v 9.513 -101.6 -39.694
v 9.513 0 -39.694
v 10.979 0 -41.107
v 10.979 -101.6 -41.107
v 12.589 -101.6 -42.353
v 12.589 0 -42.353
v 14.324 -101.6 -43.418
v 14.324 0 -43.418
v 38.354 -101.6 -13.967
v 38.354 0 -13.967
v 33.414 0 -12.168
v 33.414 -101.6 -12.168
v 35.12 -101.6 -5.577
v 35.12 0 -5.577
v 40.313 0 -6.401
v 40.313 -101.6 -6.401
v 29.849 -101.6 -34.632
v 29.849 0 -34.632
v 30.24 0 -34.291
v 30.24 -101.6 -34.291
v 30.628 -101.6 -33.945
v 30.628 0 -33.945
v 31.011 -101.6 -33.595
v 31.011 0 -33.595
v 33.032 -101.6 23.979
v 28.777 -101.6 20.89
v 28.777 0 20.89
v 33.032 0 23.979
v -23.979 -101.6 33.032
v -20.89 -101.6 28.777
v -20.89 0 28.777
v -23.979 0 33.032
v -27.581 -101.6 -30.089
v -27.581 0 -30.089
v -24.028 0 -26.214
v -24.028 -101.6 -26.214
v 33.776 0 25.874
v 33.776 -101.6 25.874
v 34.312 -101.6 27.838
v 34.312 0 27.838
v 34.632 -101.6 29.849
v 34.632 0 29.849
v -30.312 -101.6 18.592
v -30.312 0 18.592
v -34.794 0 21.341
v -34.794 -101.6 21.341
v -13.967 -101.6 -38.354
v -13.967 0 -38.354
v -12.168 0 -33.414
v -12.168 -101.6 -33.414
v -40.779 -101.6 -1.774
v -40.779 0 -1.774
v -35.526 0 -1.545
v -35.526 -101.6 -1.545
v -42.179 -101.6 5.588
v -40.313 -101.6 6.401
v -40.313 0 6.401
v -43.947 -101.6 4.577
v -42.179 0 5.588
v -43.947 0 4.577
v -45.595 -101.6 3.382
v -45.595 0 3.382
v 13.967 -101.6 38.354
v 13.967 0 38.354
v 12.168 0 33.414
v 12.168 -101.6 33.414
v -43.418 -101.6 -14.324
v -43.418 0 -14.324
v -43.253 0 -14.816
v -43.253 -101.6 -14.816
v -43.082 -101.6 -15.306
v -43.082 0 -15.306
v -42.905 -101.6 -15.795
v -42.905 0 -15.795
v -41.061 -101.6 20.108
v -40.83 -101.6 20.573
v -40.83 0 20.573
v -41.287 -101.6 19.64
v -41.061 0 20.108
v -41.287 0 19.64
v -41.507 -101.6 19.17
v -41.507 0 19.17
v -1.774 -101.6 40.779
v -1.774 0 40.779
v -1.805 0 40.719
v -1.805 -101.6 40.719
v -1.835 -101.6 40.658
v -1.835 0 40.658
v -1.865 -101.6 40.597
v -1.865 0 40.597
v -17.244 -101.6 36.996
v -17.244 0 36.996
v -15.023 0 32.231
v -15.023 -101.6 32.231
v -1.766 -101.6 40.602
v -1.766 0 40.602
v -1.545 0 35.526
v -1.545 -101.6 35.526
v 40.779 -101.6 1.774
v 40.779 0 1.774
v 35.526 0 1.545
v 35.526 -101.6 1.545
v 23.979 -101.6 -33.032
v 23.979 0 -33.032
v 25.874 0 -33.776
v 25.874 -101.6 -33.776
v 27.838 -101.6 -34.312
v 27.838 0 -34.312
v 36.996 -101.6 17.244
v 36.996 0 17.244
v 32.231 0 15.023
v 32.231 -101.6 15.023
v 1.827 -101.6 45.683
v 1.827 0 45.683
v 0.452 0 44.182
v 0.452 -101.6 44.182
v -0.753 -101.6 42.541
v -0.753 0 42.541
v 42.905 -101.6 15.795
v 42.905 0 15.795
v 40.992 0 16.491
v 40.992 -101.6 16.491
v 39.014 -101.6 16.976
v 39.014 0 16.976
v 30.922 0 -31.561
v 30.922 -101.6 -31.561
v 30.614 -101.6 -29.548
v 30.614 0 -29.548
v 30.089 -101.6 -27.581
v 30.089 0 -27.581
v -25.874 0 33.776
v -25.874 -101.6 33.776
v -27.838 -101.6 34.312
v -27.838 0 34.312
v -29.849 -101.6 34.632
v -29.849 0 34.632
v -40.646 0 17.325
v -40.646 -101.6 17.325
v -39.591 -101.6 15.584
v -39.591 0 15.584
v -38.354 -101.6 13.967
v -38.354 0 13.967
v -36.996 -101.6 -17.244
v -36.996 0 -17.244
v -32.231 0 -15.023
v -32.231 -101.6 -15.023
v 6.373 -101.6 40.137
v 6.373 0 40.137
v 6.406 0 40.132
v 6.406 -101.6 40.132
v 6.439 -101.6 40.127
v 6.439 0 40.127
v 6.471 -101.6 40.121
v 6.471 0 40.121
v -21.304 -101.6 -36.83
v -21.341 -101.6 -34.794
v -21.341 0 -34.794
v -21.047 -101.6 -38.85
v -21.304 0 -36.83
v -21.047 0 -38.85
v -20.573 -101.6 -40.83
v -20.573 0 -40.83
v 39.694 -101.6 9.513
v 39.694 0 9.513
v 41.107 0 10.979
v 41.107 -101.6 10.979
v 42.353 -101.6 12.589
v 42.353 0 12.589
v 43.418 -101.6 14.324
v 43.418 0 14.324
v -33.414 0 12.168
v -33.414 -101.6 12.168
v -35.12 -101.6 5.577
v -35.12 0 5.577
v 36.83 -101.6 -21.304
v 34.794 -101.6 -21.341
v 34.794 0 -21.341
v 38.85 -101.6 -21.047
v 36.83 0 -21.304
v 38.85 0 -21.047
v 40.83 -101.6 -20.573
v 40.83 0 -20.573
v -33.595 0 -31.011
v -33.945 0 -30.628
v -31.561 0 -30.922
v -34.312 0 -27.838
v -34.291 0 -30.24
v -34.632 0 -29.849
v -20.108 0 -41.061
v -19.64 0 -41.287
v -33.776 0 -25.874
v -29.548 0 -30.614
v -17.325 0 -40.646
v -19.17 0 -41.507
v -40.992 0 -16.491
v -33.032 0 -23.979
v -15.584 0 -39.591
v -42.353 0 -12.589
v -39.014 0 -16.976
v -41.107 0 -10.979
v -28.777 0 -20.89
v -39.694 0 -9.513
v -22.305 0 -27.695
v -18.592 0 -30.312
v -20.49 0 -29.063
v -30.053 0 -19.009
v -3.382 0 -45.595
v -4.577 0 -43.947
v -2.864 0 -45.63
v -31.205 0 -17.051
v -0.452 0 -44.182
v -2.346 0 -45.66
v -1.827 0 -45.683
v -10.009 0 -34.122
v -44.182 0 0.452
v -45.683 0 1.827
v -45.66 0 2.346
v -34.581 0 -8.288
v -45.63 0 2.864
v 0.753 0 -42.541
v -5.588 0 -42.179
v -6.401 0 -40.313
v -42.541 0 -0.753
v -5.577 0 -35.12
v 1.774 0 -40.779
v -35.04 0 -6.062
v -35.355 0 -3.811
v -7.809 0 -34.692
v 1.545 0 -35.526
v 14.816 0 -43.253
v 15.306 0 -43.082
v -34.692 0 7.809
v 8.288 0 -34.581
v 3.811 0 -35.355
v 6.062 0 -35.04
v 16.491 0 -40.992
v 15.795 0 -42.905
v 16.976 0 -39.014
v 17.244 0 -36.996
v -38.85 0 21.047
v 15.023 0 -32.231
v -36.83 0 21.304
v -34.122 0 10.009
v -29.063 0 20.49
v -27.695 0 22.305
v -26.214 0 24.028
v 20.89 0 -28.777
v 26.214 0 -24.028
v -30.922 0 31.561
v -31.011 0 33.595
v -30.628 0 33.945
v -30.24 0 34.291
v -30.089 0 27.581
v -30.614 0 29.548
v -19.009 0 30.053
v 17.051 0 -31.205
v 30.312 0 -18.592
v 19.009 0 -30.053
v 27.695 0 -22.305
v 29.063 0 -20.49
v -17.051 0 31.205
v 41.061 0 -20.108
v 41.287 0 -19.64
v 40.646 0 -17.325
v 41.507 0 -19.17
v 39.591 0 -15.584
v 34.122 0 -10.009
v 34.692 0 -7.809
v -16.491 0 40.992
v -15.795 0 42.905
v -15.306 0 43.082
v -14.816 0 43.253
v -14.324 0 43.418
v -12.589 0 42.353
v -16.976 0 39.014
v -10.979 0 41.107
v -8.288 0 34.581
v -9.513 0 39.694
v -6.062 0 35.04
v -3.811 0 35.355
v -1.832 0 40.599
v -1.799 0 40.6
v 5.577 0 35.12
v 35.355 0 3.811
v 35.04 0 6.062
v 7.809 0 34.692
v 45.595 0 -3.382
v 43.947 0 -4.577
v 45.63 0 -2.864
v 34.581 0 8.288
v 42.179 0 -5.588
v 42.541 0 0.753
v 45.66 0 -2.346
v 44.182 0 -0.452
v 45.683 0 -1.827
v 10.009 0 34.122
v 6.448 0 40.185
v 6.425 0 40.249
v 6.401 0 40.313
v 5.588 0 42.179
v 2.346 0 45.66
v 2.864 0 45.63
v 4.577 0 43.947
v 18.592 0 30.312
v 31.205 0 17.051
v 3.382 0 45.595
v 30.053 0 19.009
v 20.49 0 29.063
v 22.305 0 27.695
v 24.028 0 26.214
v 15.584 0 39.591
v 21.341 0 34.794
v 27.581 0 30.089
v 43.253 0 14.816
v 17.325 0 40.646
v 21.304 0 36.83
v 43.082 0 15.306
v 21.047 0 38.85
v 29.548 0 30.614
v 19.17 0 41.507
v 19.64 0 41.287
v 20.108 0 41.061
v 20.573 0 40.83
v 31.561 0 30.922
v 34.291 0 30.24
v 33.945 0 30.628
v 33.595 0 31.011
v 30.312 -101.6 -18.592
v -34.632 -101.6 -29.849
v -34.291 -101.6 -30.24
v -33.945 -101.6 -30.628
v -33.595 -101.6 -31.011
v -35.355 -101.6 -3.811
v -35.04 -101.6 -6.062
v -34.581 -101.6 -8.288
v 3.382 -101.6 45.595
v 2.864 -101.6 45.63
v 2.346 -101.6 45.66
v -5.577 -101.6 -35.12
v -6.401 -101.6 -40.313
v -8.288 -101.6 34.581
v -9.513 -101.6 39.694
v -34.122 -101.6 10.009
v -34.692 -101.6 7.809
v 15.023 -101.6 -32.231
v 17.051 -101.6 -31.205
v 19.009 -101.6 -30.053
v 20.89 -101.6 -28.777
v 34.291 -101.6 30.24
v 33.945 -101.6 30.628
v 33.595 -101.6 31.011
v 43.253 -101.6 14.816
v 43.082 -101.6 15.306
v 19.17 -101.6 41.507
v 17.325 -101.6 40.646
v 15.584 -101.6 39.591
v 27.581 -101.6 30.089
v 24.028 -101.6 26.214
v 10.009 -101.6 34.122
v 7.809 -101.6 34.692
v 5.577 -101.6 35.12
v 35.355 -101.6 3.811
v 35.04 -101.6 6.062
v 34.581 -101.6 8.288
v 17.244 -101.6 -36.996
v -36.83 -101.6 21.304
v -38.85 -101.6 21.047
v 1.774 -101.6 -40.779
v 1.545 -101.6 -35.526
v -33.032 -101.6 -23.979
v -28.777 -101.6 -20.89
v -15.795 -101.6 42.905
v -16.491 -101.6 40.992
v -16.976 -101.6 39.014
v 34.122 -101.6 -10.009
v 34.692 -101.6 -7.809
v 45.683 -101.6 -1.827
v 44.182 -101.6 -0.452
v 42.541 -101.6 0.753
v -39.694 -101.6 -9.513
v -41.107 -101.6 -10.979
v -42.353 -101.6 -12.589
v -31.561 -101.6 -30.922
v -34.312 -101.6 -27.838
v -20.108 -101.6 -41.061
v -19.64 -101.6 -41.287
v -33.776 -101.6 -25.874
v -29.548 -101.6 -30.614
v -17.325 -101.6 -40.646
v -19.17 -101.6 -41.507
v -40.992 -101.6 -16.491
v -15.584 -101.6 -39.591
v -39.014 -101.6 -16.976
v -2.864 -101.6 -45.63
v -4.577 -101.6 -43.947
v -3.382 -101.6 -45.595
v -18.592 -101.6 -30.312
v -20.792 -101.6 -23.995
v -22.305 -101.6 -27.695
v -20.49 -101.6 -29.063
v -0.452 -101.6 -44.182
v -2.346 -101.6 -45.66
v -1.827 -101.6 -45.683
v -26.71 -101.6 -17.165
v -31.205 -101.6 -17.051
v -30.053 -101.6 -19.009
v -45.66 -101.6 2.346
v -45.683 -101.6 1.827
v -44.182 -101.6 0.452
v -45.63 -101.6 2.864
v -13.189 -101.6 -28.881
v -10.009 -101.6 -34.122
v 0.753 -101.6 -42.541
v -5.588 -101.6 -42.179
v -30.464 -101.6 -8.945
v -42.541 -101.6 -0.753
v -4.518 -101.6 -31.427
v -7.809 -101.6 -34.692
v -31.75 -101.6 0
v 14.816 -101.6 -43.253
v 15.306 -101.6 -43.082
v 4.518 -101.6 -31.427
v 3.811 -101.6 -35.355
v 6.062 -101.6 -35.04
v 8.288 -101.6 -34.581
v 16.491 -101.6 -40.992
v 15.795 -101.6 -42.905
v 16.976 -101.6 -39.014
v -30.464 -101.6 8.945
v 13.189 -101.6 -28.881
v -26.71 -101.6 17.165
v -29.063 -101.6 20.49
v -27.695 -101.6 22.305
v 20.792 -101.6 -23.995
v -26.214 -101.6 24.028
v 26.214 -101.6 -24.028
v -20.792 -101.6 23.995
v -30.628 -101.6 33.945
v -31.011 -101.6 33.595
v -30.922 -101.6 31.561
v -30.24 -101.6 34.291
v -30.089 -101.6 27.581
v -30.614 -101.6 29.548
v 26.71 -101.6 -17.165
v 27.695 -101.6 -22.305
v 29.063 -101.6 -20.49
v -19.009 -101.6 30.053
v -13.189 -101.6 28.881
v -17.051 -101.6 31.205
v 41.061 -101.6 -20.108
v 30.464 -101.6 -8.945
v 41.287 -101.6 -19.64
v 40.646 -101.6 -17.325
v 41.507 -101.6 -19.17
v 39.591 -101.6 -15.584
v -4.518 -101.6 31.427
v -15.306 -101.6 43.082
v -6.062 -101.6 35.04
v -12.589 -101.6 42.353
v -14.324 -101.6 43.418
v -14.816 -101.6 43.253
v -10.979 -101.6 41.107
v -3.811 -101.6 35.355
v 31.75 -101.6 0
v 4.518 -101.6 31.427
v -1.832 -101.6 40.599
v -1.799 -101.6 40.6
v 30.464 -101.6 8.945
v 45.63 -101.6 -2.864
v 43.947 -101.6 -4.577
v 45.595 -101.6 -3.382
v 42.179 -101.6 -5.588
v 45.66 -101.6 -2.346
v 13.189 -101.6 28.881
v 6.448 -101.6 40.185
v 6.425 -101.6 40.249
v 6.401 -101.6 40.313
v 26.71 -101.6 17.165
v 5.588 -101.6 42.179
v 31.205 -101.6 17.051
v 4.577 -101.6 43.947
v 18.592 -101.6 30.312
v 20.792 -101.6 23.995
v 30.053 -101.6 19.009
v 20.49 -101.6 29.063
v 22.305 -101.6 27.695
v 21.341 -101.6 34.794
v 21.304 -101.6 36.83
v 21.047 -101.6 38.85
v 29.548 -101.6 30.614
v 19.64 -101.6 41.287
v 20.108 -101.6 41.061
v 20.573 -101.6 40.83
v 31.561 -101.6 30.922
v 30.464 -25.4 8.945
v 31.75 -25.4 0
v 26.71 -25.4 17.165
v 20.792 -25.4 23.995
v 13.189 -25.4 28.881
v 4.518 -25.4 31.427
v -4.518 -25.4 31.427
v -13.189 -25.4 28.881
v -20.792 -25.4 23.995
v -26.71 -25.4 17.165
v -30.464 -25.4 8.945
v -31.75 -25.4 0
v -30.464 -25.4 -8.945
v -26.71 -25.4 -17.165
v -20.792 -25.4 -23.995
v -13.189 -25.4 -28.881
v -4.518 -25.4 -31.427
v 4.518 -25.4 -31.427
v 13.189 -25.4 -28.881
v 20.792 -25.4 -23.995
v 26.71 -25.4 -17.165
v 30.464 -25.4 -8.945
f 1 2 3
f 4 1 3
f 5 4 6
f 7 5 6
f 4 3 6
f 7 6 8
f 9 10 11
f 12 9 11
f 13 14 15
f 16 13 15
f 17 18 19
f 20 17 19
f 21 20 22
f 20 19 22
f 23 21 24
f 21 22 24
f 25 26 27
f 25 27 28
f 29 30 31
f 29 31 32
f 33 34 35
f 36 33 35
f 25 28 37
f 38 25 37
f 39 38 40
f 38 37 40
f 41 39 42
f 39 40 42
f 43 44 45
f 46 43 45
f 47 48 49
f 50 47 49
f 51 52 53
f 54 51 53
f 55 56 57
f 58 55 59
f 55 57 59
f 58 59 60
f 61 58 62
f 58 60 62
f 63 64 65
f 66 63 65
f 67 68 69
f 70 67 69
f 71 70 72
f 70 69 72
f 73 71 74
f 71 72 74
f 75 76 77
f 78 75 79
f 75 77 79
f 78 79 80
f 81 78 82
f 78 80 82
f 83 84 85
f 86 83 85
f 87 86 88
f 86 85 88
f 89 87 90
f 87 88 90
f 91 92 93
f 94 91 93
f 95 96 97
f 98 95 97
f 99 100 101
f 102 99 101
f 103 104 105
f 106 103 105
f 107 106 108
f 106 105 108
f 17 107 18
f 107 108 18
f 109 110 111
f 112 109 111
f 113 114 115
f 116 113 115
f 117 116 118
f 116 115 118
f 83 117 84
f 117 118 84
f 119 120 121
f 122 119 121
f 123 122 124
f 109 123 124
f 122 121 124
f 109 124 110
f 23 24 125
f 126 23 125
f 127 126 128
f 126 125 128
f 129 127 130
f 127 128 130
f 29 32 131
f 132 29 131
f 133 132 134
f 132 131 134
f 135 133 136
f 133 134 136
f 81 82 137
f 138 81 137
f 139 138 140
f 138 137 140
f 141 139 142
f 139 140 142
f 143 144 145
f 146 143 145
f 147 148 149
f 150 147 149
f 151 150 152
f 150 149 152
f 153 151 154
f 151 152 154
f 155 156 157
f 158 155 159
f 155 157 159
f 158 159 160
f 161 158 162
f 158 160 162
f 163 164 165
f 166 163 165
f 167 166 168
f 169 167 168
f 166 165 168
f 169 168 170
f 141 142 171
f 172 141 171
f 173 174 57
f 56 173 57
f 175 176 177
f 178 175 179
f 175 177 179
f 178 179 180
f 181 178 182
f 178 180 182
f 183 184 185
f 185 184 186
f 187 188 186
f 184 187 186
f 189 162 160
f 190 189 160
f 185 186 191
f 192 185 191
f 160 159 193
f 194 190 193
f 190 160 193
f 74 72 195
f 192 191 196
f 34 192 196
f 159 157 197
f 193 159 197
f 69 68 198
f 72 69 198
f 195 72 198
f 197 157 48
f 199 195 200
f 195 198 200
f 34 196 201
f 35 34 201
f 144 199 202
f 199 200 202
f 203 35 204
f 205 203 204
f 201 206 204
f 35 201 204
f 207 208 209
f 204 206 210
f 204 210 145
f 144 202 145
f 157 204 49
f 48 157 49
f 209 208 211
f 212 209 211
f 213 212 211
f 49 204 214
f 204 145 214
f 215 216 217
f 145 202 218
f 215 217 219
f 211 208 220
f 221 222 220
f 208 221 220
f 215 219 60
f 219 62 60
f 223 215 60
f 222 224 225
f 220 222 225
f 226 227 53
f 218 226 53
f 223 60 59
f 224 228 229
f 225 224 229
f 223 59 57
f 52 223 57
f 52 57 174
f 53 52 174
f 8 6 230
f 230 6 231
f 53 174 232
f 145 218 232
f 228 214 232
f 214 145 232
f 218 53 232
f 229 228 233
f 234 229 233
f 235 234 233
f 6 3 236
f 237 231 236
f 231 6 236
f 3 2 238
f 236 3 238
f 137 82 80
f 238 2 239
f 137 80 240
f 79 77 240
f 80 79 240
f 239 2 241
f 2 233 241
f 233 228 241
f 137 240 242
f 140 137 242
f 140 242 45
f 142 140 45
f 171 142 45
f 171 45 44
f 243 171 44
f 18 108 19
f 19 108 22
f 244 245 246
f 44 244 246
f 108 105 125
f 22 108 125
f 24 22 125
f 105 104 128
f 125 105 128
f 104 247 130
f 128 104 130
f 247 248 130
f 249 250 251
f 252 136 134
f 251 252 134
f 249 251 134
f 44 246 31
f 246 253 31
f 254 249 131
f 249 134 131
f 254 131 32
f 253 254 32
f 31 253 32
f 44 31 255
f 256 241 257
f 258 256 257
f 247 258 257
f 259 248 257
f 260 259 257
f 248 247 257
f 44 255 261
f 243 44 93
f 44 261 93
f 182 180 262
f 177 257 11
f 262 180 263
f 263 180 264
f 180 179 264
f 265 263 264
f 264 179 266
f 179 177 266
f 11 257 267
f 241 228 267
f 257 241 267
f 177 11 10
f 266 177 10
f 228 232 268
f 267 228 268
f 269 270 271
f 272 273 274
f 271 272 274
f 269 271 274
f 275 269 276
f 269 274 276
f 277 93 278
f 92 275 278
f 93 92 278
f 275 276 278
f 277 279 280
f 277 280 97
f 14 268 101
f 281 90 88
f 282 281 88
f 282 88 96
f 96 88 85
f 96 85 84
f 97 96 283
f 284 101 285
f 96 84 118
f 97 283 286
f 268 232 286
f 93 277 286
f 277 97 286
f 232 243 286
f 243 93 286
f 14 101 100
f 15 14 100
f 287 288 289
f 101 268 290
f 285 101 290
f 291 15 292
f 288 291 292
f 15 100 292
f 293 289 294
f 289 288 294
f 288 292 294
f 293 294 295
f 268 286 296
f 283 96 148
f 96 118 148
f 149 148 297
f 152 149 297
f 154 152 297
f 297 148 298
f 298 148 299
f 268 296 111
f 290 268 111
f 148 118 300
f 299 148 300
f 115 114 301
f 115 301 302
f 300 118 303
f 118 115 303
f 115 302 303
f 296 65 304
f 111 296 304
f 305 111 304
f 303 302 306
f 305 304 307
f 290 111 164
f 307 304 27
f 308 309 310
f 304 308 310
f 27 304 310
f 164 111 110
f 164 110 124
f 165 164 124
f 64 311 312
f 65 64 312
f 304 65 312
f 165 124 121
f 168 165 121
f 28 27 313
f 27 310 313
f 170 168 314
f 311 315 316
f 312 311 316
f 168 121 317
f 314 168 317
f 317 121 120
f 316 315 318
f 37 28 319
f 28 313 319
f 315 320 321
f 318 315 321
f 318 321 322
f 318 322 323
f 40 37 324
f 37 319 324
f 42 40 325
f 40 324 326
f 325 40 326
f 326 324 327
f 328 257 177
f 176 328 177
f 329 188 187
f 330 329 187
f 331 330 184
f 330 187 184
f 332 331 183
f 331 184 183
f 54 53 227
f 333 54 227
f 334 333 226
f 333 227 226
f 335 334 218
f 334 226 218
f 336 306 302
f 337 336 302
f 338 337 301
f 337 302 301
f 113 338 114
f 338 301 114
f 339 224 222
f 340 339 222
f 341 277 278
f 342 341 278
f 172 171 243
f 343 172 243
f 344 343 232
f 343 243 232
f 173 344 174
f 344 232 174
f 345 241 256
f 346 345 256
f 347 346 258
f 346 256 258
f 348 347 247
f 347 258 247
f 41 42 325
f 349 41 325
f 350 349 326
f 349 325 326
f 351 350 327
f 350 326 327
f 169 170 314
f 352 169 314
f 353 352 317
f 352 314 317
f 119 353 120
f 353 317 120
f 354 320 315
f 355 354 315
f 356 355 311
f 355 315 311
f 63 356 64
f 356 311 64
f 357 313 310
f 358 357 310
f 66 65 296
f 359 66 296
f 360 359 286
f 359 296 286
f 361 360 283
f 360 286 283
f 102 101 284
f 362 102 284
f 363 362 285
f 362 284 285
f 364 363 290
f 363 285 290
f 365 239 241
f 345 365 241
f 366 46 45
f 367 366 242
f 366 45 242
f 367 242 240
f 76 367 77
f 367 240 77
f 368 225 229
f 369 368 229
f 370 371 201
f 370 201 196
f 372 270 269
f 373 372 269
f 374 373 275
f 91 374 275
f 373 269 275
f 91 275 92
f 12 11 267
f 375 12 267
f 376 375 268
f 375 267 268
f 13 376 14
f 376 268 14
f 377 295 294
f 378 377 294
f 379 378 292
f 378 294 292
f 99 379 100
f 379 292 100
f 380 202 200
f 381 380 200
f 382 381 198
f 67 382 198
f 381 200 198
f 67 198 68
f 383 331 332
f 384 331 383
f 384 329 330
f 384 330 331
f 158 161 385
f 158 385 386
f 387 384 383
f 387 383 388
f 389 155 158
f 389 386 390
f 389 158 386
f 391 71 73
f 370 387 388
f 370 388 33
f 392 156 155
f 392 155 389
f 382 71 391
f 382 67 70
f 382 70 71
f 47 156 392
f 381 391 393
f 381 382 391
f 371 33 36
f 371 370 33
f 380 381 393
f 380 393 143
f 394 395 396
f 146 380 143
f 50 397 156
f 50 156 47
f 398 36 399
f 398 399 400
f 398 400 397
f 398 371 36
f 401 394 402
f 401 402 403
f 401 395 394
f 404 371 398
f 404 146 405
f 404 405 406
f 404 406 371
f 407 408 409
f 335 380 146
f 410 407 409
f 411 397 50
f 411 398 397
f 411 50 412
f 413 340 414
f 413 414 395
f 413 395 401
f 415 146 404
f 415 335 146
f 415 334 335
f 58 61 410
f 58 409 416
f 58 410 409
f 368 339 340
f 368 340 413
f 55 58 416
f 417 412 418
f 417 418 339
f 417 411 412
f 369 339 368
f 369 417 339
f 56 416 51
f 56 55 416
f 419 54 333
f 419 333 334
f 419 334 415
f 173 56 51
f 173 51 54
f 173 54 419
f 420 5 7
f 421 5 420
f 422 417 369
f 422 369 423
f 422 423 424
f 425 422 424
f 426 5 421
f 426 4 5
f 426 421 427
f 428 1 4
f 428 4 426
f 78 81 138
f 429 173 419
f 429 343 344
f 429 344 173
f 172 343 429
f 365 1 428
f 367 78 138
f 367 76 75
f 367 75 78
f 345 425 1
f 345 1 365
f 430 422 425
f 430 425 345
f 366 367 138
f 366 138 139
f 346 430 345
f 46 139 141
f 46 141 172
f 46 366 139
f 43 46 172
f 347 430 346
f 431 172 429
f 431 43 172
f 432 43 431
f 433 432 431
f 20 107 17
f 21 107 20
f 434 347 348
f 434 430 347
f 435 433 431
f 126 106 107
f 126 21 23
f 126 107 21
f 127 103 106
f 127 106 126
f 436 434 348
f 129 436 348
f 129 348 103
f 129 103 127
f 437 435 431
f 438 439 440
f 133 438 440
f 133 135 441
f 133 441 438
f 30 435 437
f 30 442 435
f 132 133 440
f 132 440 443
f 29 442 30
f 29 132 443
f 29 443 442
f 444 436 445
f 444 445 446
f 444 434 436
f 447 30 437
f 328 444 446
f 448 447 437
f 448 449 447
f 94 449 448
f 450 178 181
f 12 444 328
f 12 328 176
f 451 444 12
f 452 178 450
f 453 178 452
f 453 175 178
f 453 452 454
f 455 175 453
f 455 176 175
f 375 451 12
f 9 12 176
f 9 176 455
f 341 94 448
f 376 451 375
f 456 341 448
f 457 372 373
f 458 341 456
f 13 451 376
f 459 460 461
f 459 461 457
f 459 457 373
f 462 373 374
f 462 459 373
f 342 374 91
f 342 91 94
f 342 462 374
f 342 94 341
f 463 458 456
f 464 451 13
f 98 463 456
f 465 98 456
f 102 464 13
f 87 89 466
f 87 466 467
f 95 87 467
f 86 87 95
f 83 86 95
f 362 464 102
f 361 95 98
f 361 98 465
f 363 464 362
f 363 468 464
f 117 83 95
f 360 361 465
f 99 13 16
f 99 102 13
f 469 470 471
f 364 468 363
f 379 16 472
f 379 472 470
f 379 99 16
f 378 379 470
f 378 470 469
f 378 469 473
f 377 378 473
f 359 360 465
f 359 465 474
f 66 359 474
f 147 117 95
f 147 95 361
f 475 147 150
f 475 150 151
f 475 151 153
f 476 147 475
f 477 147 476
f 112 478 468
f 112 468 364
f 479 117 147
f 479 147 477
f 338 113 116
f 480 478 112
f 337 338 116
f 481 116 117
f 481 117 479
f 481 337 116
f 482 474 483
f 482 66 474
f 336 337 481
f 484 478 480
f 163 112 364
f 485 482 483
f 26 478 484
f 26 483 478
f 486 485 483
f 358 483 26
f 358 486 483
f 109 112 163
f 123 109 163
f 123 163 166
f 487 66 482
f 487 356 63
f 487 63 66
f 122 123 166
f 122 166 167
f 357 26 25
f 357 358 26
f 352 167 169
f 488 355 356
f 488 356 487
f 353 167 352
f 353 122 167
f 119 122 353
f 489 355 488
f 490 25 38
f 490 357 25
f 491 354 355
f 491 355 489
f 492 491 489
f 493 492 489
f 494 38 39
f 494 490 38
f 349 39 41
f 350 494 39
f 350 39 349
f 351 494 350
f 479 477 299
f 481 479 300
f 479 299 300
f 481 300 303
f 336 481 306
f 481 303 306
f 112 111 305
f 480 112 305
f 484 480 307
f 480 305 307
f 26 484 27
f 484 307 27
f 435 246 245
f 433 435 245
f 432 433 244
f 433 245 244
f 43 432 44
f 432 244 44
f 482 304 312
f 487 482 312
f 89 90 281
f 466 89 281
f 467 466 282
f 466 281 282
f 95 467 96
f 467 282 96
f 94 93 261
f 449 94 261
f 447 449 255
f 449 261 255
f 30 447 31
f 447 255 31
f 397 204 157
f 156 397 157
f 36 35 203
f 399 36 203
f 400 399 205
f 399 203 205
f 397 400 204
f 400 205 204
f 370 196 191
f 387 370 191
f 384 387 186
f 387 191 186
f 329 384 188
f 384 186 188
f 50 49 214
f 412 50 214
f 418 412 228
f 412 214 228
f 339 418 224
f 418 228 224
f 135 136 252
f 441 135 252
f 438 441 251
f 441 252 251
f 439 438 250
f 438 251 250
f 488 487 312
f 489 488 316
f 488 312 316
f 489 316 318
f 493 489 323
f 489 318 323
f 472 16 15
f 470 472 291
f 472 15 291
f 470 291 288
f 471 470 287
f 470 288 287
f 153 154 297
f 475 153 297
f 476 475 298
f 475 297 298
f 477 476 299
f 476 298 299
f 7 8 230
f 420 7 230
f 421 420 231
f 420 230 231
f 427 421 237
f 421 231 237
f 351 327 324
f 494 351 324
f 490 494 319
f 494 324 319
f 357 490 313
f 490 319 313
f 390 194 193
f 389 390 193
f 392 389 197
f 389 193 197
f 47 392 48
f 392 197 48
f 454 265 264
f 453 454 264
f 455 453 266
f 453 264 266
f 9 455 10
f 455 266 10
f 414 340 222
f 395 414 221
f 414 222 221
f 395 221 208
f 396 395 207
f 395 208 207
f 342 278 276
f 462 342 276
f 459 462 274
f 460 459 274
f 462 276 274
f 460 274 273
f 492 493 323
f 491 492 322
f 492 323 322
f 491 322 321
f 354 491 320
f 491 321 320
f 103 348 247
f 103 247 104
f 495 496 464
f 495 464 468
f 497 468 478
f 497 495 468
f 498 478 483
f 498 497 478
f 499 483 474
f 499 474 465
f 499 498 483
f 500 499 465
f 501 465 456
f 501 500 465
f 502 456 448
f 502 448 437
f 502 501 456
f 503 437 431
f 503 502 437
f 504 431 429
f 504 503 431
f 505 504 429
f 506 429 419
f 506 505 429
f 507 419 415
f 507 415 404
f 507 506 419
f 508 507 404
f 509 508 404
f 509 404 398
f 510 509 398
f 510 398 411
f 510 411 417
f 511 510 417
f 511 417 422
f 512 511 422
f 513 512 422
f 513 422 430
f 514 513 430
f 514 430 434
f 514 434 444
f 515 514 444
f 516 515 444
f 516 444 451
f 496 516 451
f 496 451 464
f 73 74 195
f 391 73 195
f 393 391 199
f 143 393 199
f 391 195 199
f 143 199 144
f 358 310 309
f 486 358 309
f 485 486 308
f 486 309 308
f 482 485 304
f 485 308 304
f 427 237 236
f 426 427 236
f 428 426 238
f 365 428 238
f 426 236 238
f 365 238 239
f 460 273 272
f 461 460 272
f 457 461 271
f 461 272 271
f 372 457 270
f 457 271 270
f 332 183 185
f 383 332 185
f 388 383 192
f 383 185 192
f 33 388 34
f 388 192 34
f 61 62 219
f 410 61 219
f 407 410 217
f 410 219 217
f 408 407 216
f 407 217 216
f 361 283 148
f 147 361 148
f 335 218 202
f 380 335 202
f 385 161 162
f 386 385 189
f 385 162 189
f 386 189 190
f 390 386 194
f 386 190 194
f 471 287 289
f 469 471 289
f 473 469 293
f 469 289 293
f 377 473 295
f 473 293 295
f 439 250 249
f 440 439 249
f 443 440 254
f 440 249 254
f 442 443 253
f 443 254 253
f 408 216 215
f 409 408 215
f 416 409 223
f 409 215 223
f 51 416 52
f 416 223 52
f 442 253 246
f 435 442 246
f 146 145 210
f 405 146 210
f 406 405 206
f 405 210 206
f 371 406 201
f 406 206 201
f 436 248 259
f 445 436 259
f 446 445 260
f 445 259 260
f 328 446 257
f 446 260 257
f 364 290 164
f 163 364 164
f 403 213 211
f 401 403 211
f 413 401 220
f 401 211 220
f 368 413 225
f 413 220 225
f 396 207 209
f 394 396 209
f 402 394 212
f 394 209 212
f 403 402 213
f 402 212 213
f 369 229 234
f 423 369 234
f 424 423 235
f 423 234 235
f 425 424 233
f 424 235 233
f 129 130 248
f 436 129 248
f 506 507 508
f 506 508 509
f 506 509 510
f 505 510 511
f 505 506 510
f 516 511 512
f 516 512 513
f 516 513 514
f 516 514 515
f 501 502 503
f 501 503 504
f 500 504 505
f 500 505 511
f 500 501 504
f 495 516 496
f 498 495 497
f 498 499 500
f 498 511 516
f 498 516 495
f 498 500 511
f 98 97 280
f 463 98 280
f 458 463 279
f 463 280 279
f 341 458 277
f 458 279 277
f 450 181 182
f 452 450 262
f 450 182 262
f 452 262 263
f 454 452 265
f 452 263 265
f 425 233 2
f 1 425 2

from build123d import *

# Parameters (mm, degrees)
F0_R     = 31.75
F1_DEPTH = 101.6
F2_R     = 31.75
F3_DEPTH = 25.4


with BuildPart() as f1:
    # F0 (on Front) → F1 (new body)
    with BuildSketch(Plane.XZ):
        with BuildLine():
            ThreePointArc((6.401351, 40.312523), (5.106646, 43.076548), (3.381897, 45.594749))
            ThreePointArc((3.381897, 45.594749), (2.604737, 45.645742), (1.826821, 45.683489))
            ThreePointArc((1.826821, 45.683489), (-0.173197, 43.377838), (-1.773928, 40.779038))
            Line((-1.773928, 40.779038), (-1.766209, 40.601602))
            Line((-1.766209, 40.601602), (-1.545433, 35.526402))
            ThreePointArc((-1.545433, 35.526402), (-4.939165, 35.215313), (-8.287532, 34.580781))
            Line((-8.287532, 34.580781), (-9.512858, 39.693606))
            ThreePointArc((-9.512858, 39.693606), (-11.766756, 41.75177), (-14.32389, 43.418252))
            ThreePointArc((-14.32389, 43.418252), (-15.061406, 43.167956), (-15.794552, 42.905134))
            ThreePointArc((-15.794552, 42.905134), (-16.759993, 40.009617), (-17.244358, 36.996066))
            Line((-17.244358, 36.996066), (-15.023159, 32.230704))
            ThreePointArc((-15.023159, 32.230704), (-18.03951, 30.64457), (-20.890174, 28.776974))
            Line((-20.890174, 28.776974), (-23.97882, 33.031697))
            ThreePointArc((-23.97882, 33.031697), (-26.848775, 34.070663), (-29.848994, 34.631719))
            ThreePointArc((-29.848994, 34.631719), (-30.434587, 34.118241), (-31.011347, 33.594862))
            ThreePointArc((-31.011347, 33.594862), (-30.795232, 30.550294), (-30.089491, 27.580778))
            Line((-30.089491, 27.580778), (-26.213746, 24.028174))
            ThreePointArc((-26.213746, 24.028174), (-28.393504, 21.408469), (-30.312475, 18.592134))
            Line((-30.312475, 18.592134), (-34.794224, 21.341012))
            ThreePointArc((-34.794224, 21.341012), (-37.843312, 21.202607), (-40.82986, 20.572821))
            ThreePointArc((-40.82986, 20.572821), (-41.174377, 19.874332), (-41.506946, 19.170076))
            ThreePointArc((-41.506946, 19.170076), (-40.142176, 16.439967), (-38.353772, 13.966567))
            Line((-38.353772, 13.966567), (-33.413527, 12.167572))
            ThreePointArc((-33.413527, 12.167572), (-34.424843, 8.913123), (-35.119977, 5.57681))
            Line((-35.119977, 5.57681), (-40.312523, 6.401351))
            ThreePointArc((-40.312523, 6.401351), (-43.076548, 5.106646), (-45.594749, 3.381897))
            ThreePointArc((-45.594749, 3.381897), (-45.645742, 2.604737), (-45.683489, 1.826821))
            ThreePointArc((-45.683489, 1.826821), (-43.377838, -0.173197), (-40.779038, -1.773928))
            Line((-40.779038, -1.773928), (-35.526402, -1.545433))
            ThreePointArc((-35.526402, -1.545433), (-35.215313, -4.939165), (-34.580781, -8.287532))
            Line((-34.580781, -8.287532), (-39.693606, -9.512858))
            ThreePointArc((-39.693606, -9.512858), (-41.75177, -11.766756), (-43.418252, -14.32389))
            ThreePointArc((-43.418252, -14.32389), (-43.167956, -15.061406), (-42.905134, -15.794552))
            ThreePointArc((-42.905134, -15.794552), (-40.009617, -16.759993), (-36.996066, -17.244358))
            Line((-36.996066, -17.244358), (-32.230704, -15.023159))
            ThreePointArc((-32.230704, -15.023159), (-30.64457, -18.03951), (-28.776974, -20.890174))
            Line((-28.776974, -20.890174), (-33.031697, -23.97882))
            ThreePointArc((-33.031697, -23.97882), (-34.070663, -26.848775), (-34.631719, -29.848994))
            ThreePointArc((-34.631719, -29.848994), (-34.118241, -30.434587), (-33.594862, -31.011347))
            ThreePointArc((-33.594862, -31.011347), (-30.550294, -30.795232), (-27.580778, -30.089491))
            Line((-27.580778, -30.089491), (-24.028174, -26.213746))
            ThreePointArc((-24.028174, -26.213746), (-21.408469, -28.393504), (-18.592134, -30.312475))
            Line((-18.592134, -30.312475), (-21.341012, -34.794224))
            ThreePointArc((-21.341012, -34.794224), (-21.202607, -37.843312), (-20.572821, -40.82986))
            ThreePointArc((-20.572821, -40.82986), (-19.874332, -41.174377), (-19.170076, -41.506946))
            ThreePointArc((-19.170076, -41.506946), (-16.439967, -40.142176), (-13.966567, -38.353772))
            Line((-13.966567, -38.353772), (-12.167572, -33.413527))
            ThreePointArc((-12.167572, -33.413527), (-8.913123, -34.424843), (-5.57681, -35.119977))
            Line((-5.57681, -35.119977), (-6.401351, -40.312523))
            ThreePointArc((-6.401351, -40.312523), (-5.106646, -43.076548), (-3.381897, -45.594749))
            ThreePointArc((-3.381897, -45.594749), (-2.604737, -45.645742), (-1.826821, -45.683489))
            ThreePointArc((-1.826821, -45.683489), (0.173197, -43.377838), (1.773928, -40.779038))
            Line((1.773928, -40.779038), (1.545433, -35.526402))
            ThreePointArc((1.545433, -35.526402), (4.939165, -35.215313), (8.287532, -34.580781))
            Line((8.287532, -34.580781), (9.512858, -39.693606))
            ThreePointArc((9.512858, -39.693606), (11.766756, -41.75177), (14.32389, -43.418252))
            ThreePointArc((14.32389, -43.418252), (15.061406, -43.167956), (15.794552, -42.905134))
            ThreePointArc((15.794552, -42.905134), (16.759993, -40.009617), (17.244358, -36.996066))
            Line((17.244358, -36.996066), (15.023159, -32.230704))
            ThreePointArc((15.023159, -32.230704), (18.03951, -30.64457), (20.890174, -28.776974))
            Line((20.890174, -28.776974), (23.97882, -33.031697))
            ThreePointArc((23.97882, -33.031697), (26.848775, -34.070663), (29.848994, -34.631719))
            ThreePointArc((29.848994, -34.631719), (30.434587, -34.118241), (31.011347, -33.594862))
            ThreePointArc((31.011347, -33.594862), (30.795232, -30.550294), (30.089491, -27.580778))
            Line((30.089491, -27.580778), (26.213746, -24.028174))
            ThreePointArc((26.213746, -24.028174), (28.393504, -21.408469), (30.312475, -18.592134))
            Line((30.312475, -18.592134), (34.794224, -21.341012))
            ThreePointArc((34.794224, -21.341012), (37.843312, -21.202607), (40.82986, -20.572821))
            ThreePointArc((40.82986, -20.572821), (41.174377, -19.874332), (41.506946, -19.170076))
            ThreePointArc((41.506946, -19.170076), (40.142176, -16.439967), (38.353772, -13.966567))
            Line((38.353772, -13.966567), (33.413527, -12.167572))
            ThreePointArc((33.413527, -12.167572), (34.424843, -8.913123), (35.119977, -5.57681))
            Line((35.119977, -5.57681), (40.312523, -6.401351))
            ThreePointArc((40.312523, -6.401351), (43.076548, -5.106646), (45.594749, -3.381897))
            ThreePointArc((45.594749, -3.381897), (45.645742, -2.604737), (45.683489, -1.826821))
            ThreePointArc((45.683489, -1.826821), (43.377838, 0.173197), (40.779038, 1.773928))
            Line((40.779038, 1.773928), (35.526402, 1.545433))
            ThreePointArc((35.526402, 1.545433), (35.215313, 4.939165), (34.580781, 8.287532))
            Line((34.580781, 8.287532), (39.693606, 9.512858))
            ThreePointArc((39.693606, 9.512858), (41.75177, 11.766756), (43.418252, 14.32389))
            ThreePointArc((43.418252, 14.32389), (43.167956, 15.061406), (42.905134, 15.794552))
            ThreePointArc((42.905134, 15.794552), (40.009617, 16.759993), (36.996066, 17.244358))
            Line((36.996066, 17.244358), (32.230704, 15.023159))
            ThreePointArc((32.230704, 15.023159), (30.64457, 18.03951), (28.776974, 20.890174))
            Line((28.776974, 20.890174), (33.031697, 23.97882))
            ThreePointArc((33.031697, 23.97882), (34.070663, 26.848775), (34.631719, 29.848994))
            ThreePointArc((34.631719, 29.848994), (34.118241, 30.434587), (33.594862, 31.011347))
            ThreePointArc((33.594862, 31.011347), (30.550294, 30.795232), (27.580778, 30.089491))
            Line((27.580778, 30.089491), (24.028174, 26.213746))
            ThreePointArc((24.028174, 26.213746), (21.408469, 28.393504), (18.592134, 30.312475))
            Line((18.592134, 30.312475), (21.341012, 34.794224))
            ThreePointArc((21.341012, 34.794224), (21.202607, 37.843312), (20.572821, 40.82986))
            ThreePointArc((20.572821, 40.82986), (19.874332, 41.174377), (19.170076, 41.506946))
            ThreePointArc((19.170076, 41.506946), (16.439967, 40.142176), (13.966567, 38.353772))
            Line((13.966567, 38.353772), (12.167572, 33.413527))
            ThreePointArc((12.167572, 33.413527), (8.913123, 34.424843), (5.57681, 35.119977))
            Line((5.57681, 35.119977), (6.373497, 40.137117))
            Line((6.373497, 40.137117), (6.401351, 40.312523))
        make_face()
        Circle(F0_R, mode=Mode.SUBTRACT)
        with BuildLine():
            ThreePointArc((6.471406, 40.121447), (6.436637, 40.21708), (6.401351, 40.312523))
            Line((6.401351, 40.312523), (6.373497, 40.137117))
            ThreePointArc((6.373497, 40.137117), (6.422456, 40.129312), (6.471406, 40.121447))
        make_face()
        with BuildLine():
            Line((-1.766209, 40.601602), (-1.773928, 40.779038))
            ThreePointArc((-1.773928, 40.779038), (-1.819842, 40.688229), (-1.865264, 40.597172))
            ThreePointArc((-1.865264, 40.597172), (-1.815738, 40.599417), (-1.766209, 40.601602))
        make_face()
    extrude(amount=F1_DEPTH)

    # F2 (on Front) → F3 (join)
    with BuildSketch(Plane.XZ):
        Circle(F2_R)
    extrude(amount=F3_DEPTH)


solid = f1.part
